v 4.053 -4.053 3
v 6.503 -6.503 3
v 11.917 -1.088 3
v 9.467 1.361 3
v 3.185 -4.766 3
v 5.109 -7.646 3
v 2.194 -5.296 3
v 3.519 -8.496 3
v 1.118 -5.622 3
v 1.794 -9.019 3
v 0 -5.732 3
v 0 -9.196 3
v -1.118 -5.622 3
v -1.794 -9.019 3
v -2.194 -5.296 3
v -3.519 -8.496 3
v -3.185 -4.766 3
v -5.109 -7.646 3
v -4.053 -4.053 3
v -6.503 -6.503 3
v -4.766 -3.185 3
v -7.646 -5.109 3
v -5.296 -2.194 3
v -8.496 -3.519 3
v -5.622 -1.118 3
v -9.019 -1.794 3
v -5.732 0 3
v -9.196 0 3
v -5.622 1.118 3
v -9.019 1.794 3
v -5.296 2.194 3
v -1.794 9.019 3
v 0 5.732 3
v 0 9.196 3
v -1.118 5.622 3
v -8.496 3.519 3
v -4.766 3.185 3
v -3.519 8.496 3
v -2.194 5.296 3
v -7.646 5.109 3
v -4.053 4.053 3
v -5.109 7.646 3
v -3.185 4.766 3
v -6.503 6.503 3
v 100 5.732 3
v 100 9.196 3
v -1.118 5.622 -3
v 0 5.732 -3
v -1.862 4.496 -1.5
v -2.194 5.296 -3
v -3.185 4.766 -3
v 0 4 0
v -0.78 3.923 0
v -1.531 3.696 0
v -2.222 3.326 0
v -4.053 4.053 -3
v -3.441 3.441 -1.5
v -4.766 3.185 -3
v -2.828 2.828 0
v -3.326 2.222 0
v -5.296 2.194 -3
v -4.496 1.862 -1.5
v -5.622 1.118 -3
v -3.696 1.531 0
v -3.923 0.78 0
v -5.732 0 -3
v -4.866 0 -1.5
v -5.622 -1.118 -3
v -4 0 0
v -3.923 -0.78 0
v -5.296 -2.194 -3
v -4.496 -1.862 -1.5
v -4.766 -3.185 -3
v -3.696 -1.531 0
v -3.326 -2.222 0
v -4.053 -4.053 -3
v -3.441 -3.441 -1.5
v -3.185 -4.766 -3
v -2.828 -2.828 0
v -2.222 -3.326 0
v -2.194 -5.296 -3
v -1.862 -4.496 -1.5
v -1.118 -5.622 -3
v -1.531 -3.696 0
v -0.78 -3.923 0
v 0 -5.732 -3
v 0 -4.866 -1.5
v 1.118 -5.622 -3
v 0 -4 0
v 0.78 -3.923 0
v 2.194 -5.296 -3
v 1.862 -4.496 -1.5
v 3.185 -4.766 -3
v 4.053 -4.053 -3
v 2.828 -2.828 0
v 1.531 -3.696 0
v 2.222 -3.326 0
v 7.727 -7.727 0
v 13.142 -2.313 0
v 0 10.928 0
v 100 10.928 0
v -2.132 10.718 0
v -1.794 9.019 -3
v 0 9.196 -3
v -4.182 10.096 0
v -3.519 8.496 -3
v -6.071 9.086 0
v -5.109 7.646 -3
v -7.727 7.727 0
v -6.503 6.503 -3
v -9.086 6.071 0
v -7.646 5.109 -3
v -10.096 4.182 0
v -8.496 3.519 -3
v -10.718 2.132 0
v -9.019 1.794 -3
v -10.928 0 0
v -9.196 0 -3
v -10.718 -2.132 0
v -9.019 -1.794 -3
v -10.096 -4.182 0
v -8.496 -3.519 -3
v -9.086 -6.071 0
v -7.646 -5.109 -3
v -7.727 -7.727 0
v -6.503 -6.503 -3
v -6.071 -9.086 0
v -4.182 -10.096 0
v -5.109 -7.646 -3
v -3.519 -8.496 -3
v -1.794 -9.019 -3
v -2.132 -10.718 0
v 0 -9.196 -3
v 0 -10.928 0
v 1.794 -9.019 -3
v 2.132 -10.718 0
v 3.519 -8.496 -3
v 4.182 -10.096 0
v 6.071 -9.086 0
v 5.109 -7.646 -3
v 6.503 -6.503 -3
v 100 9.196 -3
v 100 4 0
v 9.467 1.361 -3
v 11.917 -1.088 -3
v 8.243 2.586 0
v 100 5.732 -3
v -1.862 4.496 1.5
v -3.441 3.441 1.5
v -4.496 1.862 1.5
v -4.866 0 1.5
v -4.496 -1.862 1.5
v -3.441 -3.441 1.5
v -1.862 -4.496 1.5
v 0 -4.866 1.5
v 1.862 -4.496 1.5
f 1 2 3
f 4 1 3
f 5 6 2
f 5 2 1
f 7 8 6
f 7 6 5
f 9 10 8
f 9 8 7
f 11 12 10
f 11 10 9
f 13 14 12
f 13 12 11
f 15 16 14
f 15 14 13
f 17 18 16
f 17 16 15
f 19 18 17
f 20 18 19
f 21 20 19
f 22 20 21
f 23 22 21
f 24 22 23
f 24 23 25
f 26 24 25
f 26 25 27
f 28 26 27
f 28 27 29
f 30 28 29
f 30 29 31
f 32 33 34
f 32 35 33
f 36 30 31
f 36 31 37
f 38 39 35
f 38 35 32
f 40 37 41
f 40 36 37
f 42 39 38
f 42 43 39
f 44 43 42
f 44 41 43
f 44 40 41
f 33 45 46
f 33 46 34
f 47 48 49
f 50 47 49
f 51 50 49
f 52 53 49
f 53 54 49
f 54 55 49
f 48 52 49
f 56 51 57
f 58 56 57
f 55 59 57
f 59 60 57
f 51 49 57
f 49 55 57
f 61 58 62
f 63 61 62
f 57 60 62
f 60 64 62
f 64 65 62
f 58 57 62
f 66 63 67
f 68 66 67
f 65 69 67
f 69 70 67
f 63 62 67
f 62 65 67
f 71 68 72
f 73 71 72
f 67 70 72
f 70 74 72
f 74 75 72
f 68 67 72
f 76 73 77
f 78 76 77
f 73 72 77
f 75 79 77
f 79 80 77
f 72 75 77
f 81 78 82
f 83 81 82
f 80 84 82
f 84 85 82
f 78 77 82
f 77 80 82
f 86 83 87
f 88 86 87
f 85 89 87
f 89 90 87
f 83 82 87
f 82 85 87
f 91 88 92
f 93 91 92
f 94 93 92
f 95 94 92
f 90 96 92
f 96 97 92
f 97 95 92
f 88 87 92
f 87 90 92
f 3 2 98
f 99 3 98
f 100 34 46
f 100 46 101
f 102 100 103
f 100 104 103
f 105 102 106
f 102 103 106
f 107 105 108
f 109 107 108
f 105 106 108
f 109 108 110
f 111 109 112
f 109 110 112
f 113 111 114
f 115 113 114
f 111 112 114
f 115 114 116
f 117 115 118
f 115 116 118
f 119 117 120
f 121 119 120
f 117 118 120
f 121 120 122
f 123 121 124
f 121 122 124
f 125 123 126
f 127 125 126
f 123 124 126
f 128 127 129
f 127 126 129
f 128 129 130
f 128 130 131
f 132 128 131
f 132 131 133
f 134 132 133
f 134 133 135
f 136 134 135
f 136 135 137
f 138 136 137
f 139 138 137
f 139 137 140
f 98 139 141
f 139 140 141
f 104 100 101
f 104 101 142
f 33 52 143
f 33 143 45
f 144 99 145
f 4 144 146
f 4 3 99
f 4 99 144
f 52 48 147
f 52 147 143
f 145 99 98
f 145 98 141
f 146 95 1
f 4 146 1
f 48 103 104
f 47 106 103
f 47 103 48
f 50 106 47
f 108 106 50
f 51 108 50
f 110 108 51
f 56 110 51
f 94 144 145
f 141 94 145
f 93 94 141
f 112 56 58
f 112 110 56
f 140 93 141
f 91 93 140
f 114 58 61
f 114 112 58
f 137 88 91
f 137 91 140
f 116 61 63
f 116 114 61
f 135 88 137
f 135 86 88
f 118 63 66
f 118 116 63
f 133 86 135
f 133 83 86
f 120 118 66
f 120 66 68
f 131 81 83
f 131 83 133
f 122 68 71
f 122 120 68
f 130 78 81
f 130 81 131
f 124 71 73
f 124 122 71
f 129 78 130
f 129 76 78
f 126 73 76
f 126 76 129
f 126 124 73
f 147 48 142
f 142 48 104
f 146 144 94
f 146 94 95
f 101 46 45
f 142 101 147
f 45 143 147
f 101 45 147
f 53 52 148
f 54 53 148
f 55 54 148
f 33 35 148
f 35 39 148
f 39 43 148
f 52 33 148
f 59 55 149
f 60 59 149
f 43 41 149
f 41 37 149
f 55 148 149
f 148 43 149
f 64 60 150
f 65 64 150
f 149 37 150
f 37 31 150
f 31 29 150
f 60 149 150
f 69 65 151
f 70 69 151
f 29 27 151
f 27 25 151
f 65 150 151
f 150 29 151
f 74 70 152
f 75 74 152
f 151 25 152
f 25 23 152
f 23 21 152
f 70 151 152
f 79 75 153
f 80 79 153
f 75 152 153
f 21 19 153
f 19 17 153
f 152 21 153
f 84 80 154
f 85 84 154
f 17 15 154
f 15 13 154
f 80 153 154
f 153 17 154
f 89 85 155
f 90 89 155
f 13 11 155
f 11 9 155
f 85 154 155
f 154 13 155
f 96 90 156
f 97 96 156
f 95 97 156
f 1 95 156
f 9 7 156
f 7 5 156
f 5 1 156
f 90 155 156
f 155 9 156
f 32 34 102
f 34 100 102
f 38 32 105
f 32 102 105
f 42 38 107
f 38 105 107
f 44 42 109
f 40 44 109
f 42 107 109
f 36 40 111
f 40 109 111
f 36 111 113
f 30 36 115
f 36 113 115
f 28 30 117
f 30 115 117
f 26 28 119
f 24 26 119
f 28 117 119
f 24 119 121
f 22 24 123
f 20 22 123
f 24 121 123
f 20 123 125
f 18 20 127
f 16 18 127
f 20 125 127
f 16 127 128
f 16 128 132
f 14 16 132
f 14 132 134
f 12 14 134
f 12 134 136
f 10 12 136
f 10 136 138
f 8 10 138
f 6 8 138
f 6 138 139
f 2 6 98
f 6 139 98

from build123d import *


with BuildPart() as part:
    # Base-Sweep: sweep along a path in Sketch1
    with BuildLine(Plane.XY) as base_sweep_path:
        Line((100, 4), (0, 4))
        ThreePointArc((0, 4), (-3.69551813, -1.530733729), (2.828427125, -2.828427125))
        Line((2.828427125, -2.828427125), (8.242640687, 2.585786438))
    # Sketch2 → Base-Sweep (sweep)
    with BuildSketch(Plane(origin=(100, 4, 0), x_dir=(0, 0, 1), z_dir=(-1, 0, 0))):
        Polygon((-3, 5.196152423), (0, 6.92820323), (3, 5.196152423), (3, 1.732050808), (0, 0), (-3, 1.732050808), align=None)
    sweep(path=base_sweep_path.line)


solid = part.part
